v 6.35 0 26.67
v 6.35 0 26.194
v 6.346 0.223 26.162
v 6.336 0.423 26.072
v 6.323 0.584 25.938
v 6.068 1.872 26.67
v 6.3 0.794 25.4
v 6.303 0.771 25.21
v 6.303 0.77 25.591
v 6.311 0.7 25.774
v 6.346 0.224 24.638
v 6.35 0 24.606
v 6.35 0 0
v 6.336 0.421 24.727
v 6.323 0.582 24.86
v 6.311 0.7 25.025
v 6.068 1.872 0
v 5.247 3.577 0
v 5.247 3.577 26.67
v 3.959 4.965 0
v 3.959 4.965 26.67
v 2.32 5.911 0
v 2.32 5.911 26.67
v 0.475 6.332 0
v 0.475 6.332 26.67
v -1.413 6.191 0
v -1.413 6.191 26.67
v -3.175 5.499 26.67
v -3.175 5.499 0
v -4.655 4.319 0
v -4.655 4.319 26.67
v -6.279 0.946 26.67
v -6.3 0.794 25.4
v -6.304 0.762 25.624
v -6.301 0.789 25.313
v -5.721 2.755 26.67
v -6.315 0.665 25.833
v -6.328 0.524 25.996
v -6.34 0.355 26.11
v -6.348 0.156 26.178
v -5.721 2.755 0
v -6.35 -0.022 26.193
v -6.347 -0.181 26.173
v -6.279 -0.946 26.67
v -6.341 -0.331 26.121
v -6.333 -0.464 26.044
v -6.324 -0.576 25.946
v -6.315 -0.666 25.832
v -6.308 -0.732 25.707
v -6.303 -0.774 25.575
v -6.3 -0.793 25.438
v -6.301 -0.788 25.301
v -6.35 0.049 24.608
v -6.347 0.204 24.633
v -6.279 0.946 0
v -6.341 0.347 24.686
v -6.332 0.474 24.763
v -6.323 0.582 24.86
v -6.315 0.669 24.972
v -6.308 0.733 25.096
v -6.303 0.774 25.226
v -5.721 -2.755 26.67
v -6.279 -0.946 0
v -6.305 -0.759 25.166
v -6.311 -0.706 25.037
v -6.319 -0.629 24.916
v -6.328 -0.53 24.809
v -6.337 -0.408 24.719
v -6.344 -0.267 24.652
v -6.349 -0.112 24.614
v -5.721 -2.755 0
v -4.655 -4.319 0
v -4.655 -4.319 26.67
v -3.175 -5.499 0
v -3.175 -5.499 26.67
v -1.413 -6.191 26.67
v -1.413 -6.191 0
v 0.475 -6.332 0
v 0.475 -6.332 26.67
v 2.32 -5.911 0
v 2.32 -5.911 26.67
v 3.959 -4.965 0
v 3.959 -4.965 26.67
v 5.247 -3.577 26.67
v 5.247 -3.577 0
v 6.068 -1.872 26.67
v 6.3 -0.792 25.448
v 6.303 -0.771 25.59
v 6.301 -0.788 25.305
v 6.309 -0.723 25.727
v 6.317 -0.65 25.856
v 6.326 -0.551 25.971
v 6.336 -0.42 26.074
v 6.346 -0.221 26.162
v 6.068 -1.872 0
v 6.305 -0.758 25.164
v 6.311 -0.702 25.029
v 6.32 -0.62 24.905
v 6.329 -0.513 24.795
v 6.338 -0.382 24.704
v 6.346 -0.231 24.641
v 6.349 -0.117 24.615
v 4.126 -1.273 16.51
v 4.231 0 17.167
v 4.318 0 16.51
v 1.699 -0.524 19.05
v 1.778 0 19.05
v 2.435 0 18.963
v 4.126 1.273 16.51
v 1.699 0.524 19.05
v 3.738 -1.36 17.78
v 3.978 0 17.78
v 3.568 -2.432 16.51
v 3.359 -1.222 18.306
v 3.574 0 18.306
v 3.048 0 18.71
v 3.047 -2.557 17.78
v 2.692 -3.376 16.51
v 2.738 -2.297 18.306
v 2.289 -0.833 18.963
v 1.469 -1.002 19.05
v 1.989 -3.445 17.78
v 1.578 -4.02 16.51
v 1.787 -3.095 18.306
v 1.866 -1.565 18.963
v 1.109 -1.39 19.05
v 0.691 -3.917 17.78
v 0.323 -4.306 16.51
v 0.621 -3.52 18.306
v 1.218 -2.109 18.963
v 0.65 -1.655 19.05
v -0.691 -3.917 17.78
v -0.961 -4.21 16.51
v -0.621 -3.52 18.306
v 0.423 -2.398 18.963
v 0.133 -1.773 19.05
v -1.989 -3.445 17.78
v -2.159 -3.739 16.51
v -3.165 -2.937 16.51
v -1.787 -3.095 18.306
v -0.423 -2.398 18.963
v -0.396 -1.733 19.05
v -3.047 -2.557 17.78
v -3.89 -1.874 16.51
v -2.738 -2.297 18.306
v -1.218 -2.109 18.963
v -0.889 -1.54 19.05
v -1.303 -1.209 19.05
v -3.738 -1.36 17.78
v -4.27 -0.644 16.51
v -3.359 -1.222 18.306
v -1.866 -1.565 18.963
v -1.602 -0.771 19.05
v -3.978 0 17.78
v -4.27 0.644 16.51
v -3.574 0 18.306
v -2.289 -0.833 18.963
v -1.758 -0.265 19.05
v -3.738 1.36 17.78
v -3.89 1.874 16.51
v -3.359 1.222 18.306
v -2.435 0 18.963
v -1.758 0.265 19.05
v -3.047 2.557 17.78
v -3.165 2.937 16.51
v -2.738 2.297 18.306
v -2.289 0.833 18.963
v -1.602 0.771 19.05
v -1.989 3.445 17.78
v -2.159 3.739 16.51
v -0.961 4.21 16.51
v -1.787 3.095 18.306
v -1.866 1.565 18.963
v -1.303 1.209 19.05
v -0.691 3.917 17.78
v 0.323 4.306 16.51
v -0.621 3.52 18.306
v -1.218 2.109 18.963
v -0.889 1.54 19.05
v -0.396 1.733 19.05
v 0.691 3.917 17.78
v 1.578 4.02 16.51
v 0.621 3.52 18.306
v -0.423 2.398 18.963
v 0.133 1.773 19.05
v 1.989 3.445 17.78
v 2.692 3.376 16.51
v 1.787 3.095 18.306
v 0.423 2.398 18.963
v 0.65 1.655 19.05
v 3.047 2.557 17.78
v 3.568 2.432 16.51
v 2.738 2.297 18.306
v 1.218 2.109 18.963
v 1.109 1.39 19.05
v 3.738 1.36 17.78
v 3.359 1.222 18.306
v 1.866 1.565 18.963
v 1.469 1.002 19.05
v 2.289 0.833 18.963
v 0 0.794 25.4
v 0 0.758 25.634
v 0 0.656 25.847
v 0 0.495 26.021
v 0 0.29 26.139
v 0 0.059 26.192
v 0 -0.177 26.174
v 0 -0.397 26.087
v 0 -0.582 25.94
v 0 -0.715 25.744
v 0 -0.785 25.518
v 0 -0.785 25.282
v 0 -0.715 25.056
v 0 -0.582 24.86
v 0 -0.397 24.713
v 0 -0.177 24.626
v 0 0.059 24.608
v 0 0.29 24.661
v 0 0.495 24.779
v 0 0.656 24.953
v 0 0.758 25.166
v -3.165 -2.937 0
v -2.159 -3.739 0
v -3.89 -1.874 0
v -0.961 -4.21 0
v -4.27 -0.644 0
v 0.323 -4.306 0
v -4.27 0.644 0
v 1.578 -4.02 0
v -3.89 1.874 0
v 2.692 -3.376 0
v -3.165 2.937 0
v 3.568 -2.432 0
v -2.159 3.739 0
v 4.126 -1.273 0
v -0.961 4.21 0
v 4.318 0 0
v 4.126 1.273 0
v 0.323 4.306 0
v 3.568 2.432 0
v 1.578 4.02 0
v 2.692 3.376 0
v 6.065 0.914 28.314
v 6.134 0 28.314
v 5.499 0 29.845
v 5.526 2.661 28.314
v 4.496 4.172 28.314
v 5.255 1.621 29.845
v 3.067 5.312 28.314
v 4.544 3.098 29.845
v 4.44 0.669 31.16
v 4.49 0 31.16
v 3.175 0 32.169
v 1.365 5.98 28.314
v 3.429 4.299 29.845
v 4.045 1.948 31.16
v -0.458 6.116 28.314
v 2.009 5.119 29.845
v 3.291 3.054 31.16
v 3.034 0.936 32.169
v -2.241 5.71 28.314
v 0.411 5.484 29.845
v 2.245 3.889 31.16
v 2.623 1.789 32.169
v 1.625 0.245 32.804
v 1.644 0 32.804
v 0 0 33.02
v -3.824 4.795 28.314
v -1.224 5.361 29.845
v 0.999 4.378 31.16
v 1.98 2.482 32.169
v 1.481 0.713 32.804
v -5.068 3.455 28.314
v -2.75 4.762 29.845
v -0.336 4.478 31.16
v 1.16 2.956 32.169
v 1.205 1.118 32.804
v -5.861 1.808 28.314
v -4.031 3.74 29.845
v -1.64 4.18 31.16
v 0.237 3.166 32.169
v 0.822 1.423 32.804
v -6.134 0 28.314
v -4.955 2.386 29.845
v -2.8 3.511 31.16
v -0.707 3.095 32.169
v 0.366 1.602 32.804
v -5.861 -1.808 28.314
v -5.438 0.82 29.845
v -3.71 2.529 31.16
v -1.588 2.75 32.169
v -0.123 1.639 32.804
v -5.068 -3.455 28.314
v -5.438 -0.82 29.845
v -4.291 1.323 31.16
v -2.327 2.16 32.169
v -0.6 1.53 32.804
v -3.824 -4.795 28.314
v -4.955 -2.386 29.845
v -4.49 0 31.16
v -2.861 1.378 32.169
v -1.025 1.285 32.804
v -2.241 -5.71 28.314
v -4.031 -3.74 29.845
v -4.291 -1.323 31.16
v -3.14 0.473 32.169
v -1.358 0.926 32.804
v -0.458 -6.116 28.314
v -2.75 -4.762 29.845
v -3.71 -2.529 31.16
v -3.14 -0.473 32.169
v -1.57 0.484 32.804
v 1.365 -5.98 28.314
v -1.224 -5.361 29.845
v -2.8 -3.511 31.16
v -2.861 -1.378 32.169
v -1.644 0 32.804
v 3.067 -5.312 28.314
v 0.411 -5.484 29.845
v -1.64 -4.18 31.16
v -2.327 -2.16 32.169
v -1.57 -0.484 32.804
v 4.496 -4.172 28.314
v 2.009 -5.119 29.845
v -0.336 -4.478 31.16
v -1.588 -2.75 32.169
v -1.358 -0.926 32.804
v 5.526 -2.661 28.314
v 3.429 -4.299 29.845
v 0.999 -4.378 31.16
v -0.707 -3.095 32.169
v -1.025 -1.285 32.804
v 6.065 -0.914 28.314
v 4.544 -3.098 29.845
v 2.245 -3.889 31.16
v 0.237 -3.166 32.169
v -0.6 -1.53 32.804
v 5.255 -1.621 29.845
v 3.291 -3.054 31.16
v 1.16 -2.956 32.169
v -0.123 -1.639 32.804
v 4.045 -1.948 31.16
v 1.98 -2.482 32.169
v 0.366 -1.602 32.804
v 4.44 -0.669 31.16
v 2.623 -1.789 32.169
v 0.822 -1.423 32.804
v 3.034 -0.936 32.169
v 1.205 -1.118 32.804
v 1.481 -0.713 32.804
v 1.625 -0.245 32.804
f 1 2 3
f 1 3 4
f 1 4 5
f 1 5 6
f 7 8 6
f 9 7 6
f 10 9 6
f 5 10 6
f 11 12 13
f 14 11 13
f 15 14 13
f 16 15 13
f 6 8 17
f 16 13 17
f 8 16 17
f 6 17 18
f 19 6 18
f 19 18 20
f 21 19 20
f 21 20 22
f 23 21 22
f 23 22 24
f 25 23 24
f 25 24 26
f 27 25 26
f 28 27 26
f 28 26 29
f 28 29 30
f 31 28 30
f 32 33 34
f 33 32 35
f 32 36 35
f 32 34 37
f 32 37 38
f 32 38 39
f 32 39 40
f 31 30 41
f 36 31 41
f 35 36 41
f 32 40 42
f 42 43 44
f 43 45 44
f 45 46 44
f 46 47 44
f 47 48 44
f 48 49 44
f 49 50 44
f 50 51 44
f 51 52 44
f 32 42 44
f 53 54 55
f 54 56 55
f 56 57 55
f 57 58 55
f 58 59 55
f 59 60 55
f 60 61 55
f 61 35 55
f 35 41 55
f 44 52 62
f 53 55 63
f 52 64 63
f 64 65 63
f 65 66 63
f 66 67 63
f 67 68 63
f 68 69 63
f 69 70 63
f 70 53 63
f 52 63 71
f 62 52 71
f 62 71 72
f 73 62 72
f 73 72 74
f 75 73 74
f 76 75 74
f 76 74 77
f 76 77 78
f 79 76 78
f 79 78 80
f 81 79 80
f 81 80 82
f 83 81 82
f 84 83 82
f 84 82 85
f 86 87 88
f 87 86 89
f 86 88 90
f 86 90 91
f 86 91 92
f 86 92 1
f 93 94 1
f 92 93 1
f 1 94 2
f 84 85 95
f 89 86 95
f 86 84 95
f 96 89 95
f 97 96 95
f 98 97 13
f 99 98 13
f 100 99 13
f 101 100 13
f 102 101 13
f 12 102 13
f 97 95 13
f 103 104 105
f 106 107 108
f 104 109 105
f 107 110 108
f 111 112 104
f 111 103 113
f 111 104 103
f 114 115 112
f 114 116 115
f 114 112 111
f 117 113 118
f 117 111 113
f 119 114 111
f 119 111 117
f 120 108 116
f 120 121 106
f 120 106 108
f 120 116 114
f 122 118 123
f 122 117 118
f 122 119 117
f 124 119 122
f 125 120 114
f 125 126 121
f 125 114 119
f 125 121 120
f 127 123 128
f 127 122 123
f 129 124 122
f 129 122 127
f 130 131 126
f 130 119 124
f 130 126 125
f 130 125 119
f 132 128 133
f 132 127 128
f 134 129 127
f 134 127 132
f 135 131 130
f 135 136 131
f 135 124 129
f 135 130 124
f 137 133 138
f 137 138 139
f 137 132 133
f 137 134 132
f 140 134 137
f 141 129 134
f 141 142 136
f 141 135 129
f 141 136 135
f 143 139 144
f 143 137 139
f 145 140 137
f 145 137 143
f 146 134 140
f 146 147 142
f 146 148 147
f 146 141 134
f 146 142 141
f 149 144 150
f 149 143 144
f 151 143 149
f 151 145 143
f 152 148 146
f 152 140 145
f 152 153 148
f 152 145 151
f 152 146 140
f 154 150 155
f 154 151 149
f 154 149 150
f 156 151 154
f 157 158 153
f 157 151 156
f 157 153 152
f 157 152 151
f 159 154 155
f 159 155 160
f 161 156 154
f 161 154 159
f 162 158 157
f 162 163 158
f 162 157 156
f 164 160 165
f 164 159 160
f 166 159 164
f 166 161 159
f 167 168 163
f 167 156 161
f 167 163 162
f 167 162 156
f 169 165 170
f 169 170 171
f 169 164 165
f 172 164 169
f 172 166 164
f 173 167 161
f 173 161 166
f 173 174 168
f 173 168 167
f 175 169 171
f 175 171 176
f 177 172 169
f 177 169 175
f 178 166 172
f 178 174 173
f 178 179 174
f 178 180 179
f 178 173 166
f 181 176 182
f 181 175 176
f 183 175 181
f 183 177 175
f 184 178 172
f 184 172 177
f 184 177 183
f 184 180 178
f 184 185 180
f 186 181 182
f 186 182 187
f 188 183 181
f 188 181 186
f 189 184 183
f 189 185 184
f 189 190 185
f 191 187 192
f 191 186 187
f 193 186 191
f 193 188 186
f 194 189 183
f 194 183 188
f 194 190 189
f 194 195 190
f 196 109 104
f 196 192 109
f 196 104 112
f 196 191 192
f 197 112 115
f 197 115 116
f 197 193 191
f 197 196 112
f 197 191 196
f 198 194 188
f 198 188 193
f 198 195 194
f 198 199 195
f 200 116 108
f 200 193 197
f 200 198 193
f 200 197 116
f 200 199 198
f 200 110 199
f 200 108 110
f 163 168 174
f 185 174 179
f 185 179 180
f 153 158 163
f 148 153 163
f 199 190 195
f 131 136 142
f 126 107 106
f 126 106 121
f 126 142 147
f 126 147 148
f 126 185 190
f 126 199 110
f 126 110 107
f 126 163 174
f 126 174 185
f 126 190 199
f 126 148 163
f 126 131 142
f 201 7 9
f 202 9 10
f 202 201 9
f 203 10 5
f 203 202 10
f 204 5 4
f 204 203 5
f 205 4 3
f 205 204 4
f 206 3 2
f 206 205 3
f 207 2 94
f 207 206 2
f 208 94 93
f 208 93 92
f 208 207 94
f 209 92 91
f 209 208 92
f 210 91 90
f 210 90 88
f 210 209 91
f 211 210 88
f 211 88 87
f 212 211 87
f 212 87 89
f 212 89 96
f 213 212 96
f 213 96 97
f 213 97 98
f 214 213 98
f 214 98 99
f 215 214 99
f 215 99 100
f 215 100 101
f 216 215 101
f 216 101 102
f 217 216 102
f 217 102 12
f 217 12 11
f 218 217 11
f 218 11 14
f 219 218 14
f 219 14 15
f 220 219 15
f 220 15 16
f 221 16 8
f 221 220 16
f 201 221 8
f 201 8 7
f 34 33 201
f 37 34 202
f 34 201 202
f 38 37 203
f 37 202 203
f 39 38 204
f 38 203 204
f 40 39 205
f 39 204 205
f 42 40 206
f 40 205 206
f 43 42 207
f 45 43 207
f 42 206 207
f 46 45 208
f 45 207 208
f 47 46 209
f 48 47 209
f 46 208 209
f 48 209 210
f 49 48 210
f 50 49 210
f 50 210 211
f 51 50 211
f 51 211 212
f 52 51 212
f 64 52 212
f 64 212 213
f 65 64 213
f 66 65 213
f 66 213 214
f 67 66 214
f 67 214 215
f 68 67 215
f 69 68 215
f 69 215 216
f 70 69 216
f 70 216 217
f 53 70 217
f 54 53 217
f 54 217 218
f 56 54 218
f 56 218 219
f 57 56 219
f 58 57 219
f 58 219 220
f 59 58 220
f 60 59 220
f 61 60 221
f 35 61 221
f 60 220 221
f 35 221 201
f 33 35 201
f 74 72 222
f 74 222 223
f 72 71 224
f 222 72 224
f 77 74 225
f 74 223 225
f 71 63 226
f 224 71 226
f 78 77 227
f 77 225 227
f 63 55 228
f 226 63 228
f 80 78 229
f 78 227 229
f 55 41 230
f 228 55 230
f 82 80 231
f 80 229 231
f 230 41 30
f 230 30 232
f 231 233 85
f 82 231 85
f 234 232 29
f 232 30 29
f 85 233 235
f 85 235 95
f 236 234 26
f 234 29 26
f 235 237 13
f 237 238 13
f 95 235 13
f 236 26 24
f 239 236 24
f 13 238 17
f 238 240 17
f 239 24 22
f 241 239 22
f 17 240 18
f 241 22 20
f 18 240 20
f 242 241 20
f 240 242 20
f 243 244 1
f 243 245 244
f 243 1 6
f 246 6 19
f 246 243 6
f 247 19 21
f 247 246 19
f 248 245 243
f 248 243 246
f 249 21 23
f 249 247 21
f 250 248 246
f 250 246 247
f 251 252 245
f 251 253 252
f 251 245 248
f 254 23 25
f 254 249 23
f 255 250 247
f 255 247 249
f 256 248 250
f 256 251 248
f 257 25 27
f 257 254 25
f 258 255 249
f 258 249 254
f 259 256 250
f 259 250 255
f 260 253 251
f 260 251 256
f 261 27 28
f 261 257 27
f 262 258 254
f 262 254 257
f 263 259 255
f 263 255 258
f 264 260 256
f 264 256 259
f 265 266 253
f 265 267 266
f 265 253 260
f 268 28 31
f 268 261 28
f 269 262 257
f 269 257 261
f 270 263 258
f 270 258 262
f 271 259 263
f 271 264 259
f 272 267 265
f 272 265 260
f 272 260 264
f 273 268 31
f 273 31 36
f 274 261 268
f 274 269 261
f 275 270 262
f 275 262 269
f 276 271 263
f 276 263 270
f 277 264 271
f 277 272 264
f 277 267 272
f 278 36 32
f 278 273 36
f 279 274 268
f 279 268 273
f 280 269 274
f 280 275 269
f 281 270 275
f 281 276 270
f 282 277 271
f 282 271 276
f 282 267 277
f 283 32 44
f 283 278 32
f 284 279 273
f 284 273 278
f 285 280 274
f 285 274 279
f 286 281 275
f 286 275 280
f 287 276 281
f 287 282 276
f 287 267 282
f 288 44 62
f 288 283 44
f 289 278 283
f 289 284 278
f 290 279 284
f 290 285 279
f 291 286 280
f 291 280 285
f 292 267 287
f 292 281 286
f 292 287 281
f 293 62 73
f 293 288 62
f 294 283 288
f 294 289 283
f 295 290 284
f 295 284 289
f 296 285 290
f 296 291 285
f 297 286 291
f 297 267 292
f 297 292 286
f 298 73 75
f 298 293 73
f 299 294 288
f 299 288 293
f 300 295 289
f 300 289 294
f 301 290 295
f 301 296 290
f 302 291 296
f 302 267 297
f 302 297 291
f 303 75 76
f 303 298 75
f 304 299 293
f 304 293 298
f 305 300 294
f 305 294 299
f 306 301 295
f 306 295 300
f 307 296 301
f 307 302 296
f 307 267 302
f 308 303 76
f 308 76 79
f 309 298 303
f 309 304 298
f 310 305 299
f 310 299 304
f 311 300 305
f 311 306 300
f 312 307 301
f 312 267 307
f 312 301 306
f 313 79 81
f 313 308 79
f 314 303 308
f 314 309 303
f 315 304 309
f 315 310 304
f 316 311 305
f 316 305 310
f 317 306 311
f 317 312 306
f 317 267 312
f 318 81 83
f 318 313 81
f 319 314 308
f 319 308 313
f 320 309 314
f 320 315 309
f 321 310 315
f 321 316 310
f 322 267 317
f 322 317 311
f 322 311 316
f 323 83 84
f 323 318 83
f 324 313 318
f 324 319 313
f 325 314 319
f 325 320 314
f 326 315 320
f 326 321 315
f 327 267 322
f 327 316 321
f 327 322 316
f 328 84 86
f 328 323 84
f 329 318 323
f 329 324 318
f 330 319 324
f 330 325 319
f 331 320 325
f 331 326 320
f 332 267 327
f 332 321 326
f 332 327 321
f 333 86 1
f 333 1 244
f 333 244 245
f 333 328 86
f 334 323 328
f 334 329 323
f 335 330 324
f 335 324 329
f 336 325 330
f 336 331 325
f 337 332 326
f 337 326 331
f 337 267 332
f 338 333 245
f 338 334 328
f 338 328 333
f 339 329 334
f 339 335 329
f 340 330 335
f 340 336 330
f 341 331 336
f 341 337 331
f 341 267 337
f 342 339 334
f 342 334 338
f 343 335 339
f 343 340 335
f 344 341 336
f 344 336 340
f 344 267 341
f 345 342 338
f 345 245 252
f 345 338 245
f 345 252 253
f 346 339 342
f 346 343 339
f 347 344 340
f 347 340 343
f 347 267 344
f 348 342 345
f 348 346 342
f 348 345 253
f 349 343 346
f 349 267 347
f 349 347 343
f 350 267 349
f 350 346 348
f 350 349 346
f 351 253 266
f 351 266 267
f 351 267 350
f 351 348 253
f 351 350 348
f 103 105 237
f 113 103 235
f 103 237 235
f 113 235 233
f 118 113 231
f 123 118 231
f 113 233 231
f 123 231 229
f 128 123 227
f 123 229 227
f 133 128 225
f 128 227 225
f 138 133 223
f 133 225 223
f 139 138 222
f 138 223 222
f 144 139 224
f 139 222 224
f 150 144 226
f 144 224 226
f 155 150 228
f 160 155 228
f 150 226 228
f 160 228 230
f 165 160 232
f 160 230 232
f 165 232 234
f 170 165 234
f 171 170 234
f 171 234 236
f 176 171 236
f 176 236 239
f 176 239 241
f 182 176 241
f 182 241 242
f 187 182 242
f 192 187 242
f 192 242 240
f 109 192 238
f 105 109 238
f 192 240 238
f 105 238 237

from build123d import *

# Parameters (mm, degrees)
F0_R          = 6.35
F1_DEPTH      = 33.02
F2_R          = 6.35
F3_R          = 0.79375
F4_DEPTH      = 6.351
F4_DEPTH_BACK = 25.4
F5_R          = 4.318
F6_DEPTH      = 19.05
F7_R          = 2.54


with BuildPart() as f1:
    # F0 (on Top) → F1 (new body)
    with BuildSketch(Plane.XY):
        Circle(F0_R)
    extrude(amount=F1_DEPTH)

    # F2
    f2_edges = [f1.edges().sort_by_distance(p)[0] for p in [
        (-6.35, 0, 33.02),
    ]]
    fillet(f2_edges, radius=F2_R)

    # F3 (on Right) → F4 (cut, two sides)
    with BuildSketch(Plane.YZ) as f4_sk:
        with Locations((0, 25.4)):
            Circle(F3_R)
    extrude(amount=F4_DEPTH, mode=Mode.SUBTRACT)
    extrude(f4_sk.sketch, amount=-F4_DEPTH_BACK, mode=Mode.SUBTRACT)

    # F5 (on face) → F6 (cut)
    with BuildSketch(Plane(origin=(0, 0, 0), x_dir=(1, 0, 0), z_dir=(0, 0, -1))):
        Circle(F5_R)
    extrude(amount=-F6_DEPTH, mode=Mode.SUBTRACT)

    # F7
    f7_edges = [f1.edges().sort_by_distance(p)[0] for p in [
        (-4.318, 0, 19.05),
    ]]
    fillet(f7_edges, radius=F7_R)


solid = f1.part
